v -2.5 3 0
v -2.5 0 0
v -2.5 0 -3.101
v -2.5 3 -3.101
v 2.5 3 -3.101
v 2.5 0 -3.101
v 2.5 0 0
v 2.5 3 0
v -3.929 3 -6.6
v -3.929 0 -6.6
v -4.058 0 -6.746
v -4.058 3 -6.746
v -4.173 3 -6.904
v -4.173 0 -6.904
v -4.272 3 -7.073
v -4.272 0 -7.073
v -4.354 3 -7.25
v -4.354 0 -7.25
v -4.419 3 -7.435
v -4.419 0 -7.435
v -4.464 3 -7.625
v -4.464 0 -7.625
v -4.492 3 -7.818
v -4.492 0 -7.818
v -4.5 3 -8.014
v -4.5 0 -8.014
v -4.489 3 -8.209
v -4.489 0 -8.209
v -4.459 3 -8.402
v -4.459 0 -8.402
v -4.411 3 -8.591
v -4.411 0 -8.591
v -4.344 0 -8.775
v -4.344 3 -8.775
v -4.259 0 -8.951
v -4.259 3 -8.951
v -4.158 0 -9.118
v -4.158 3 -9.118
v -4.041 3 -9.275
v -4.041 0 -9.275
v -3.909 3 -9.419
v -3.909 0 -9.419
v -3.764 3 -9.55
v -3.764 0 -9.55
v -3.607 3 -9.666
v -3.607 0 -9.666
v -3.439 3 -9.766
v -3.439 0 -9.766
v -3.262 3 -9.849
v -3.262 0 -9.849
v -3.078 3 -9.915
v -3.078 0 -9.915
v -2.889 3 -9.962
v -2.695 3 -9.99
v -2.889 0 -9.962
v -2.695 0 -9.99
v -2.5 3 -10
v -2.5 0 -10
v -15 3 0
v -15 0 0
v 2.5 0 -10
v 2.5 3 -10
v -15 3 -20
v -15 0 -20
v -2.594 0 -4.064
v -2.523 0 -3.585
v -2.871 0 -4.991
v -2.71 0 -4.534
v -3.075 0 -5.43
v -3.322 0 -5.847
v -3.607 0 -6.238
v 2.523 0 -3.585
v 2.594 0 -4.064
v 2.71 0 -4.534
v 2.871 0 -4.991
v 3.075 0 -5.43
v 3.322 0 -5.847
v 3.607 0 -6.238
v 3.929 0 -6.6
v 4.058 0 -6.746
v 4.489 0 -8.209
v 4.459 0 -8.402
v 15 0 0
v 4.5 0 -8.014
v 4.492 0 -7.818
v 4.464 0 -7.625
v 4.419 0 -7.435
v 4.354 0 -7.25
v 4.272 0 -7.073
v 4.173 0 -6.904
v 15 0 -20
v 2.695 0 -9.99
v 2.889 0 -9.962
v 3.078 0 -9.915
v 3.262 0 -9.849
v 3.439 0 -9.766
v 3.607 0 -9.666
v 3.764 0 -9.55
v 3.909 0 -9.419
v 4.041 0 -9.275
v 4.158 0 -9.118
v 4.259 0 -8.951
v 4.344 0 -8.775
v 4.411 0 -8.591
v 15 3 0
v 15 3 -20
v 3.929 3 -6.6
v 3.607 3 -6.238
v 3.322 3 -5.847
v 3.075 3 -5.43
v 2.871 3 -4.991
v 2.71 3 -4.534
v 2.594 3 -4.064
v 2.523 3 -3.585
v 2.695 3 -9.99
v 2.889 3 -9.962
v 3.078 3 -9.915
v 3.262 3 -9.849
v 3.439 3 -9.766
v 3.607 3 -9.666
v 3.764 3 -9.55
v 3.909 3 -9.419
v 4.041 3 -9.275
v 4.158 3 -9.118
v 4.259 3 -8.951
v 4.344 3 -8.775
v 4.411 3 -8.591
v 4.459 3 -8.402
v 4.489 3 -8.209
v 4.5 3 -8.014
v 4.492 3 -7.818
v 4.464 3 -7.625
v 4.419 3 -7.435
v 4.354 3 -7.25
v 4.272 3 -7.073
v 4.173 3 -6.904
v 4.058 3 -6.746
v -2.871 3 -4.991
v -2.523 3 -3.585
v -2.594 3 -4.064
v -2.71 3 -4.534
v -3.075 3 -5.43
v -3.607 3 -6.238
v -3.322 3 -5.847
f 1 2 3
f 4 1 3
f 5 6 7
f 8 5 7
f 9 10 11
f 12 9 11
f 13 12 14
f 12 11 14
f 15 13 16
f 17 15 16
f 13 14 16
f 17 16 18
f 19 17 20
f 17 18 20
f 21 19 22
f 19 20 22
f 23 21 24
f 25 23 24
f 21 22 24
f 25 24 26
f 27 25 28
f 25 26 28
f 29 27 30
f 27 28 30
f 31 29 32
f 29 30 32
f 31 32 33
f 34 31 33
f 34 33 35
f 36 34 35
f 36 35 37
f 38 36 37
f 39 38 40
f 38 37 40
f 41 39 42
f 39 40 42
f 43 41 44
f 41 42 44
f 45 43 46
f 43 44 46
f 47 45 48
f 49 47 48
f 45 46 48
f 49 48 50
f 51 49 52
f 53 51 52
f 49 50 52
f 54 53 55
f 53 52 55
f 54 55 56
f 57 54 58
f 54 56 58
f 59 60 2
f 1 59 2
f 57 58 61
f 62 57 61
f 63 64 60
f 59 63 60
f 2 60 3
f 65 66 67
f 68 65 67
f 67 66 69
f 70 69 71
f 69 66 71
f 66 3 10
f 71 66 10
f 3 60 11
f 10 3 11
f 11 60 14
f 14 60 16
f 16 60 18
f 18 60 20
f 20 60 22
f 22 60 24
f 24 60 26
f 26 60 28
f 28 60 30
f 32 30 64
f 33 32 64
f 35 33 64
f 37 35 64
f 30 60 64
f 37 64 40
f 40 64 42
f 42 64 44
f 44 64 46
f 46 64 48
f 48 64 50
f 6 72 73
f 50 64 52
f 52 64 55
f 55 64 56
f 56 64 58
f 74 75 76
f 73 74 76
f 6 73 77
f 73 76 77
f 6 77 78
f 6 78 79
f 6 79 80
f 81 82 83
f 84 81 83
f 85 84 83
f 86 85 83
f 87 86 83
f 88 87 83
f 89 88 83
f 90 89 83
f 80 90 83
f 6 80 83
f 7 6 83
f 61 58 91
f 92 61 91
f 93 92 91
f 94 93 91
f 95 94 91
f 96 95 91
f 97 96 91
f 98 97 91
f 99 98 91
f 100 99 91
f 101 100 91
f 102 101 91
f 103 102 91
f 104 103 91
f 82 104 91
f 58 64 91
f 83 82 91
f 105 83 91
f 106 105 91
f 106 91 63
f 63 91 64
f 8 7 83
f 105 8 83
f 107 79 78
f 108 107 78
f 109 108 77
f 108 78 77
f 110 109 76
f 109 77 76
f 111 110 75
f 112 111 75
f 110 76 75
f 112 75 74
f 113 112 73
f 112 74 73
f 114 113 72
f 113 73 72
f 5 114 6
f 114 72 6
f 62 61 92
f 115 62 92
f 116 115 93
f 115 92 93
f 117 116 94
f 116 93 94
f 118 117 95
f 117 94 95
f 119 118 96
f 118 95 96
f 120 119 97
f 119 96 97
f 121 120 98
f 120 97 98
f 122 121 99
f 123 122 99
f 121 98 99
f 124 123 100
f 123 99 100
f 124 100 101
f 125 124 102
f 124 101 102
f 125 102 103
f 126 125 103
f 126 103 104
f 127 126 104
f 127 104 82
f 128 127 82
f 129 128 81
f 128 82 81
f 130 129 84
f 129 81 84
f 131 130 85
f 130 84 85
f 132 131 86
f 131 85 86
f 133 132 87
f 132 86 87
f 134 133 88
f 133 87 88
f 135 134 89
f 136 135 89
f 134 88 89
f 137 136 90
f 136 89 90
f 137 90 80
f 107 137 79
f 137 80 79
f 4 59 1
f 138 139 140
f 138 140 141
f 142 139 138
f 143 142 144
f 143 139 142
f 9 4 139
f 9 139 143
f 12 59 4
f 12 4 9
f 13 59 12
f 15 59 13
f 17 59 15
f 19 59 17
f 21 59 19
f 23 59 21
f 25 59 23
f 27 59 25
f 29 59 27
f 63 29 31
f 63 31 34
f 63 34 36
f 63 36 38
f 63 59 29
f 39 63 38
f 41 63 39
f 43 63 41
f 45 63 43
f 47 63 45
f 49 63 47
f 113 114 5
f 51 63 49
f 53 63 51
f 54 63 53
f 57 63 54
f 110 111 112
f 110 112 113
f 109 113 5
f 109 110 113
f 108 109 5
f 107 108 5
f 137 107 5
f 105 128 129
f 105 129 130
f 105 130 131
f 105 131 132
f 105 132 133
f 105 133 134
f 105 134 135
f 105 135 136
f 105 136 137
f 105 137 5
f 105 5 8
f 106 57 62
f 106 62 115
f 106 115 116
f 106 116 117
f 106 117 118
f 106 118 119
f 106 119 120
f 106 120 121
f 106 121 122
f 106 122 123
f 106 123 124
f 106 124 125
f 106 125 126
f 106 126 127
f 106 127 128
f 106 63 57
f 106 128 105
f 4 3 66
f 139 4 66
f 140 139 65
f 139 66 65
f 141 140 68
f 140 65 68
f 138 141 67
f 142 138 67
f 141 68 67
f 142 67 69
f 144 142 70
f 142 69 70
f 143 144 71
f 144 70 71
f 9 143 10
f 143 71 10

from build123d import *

# Parameters (mm, degrees)
BOSS_EXTRUDE1_DEPTH = 3


with BuildPart() as part:
    # Sketch1 → Boss-Extrude1 (new body)
    with BuildSketch(Plane(origin=(0, 0, 0), x_dir=(1, 0, 0), z_dir=(0, 1, 0))):
        with BuildLine():
            Line((-2.5, 0), (-2.5, 3.101020514))
            ThreePointArc((-2.5, 3.101020514), (-2.870899501, 4.990842879), (-3.928571429, 6.600291576))
            ThreePointArc((-3.928571429, 6.600291576), (-4.343829825, 8.774784858), (-2.5, 10))
            Line((-2.5, 10), (2.5, 10))
            ThreePointArc((2.5, 10), (4.343829825, 8.774784858), (3.928571429, 6.600291576))
            ThreePointArc((3.928571429, 6.600291576), (2.870899501, 4.990842879), (2.5, 3.101020514))
            Line((2.5, 3.101020514), (2.5, 0))
            Line((2.5, 0), (15, 0))
            Line((15, 0), (15, 20))
            Line((15, 20), (-15, 20))
            Line((-15, 20), (-15, 0))
            Line((-15, 0), (-2.5, 0))
        make_face()
    extrude(amount=BOSS_EXTRUDE1_DEPTH)


solid = part.part
